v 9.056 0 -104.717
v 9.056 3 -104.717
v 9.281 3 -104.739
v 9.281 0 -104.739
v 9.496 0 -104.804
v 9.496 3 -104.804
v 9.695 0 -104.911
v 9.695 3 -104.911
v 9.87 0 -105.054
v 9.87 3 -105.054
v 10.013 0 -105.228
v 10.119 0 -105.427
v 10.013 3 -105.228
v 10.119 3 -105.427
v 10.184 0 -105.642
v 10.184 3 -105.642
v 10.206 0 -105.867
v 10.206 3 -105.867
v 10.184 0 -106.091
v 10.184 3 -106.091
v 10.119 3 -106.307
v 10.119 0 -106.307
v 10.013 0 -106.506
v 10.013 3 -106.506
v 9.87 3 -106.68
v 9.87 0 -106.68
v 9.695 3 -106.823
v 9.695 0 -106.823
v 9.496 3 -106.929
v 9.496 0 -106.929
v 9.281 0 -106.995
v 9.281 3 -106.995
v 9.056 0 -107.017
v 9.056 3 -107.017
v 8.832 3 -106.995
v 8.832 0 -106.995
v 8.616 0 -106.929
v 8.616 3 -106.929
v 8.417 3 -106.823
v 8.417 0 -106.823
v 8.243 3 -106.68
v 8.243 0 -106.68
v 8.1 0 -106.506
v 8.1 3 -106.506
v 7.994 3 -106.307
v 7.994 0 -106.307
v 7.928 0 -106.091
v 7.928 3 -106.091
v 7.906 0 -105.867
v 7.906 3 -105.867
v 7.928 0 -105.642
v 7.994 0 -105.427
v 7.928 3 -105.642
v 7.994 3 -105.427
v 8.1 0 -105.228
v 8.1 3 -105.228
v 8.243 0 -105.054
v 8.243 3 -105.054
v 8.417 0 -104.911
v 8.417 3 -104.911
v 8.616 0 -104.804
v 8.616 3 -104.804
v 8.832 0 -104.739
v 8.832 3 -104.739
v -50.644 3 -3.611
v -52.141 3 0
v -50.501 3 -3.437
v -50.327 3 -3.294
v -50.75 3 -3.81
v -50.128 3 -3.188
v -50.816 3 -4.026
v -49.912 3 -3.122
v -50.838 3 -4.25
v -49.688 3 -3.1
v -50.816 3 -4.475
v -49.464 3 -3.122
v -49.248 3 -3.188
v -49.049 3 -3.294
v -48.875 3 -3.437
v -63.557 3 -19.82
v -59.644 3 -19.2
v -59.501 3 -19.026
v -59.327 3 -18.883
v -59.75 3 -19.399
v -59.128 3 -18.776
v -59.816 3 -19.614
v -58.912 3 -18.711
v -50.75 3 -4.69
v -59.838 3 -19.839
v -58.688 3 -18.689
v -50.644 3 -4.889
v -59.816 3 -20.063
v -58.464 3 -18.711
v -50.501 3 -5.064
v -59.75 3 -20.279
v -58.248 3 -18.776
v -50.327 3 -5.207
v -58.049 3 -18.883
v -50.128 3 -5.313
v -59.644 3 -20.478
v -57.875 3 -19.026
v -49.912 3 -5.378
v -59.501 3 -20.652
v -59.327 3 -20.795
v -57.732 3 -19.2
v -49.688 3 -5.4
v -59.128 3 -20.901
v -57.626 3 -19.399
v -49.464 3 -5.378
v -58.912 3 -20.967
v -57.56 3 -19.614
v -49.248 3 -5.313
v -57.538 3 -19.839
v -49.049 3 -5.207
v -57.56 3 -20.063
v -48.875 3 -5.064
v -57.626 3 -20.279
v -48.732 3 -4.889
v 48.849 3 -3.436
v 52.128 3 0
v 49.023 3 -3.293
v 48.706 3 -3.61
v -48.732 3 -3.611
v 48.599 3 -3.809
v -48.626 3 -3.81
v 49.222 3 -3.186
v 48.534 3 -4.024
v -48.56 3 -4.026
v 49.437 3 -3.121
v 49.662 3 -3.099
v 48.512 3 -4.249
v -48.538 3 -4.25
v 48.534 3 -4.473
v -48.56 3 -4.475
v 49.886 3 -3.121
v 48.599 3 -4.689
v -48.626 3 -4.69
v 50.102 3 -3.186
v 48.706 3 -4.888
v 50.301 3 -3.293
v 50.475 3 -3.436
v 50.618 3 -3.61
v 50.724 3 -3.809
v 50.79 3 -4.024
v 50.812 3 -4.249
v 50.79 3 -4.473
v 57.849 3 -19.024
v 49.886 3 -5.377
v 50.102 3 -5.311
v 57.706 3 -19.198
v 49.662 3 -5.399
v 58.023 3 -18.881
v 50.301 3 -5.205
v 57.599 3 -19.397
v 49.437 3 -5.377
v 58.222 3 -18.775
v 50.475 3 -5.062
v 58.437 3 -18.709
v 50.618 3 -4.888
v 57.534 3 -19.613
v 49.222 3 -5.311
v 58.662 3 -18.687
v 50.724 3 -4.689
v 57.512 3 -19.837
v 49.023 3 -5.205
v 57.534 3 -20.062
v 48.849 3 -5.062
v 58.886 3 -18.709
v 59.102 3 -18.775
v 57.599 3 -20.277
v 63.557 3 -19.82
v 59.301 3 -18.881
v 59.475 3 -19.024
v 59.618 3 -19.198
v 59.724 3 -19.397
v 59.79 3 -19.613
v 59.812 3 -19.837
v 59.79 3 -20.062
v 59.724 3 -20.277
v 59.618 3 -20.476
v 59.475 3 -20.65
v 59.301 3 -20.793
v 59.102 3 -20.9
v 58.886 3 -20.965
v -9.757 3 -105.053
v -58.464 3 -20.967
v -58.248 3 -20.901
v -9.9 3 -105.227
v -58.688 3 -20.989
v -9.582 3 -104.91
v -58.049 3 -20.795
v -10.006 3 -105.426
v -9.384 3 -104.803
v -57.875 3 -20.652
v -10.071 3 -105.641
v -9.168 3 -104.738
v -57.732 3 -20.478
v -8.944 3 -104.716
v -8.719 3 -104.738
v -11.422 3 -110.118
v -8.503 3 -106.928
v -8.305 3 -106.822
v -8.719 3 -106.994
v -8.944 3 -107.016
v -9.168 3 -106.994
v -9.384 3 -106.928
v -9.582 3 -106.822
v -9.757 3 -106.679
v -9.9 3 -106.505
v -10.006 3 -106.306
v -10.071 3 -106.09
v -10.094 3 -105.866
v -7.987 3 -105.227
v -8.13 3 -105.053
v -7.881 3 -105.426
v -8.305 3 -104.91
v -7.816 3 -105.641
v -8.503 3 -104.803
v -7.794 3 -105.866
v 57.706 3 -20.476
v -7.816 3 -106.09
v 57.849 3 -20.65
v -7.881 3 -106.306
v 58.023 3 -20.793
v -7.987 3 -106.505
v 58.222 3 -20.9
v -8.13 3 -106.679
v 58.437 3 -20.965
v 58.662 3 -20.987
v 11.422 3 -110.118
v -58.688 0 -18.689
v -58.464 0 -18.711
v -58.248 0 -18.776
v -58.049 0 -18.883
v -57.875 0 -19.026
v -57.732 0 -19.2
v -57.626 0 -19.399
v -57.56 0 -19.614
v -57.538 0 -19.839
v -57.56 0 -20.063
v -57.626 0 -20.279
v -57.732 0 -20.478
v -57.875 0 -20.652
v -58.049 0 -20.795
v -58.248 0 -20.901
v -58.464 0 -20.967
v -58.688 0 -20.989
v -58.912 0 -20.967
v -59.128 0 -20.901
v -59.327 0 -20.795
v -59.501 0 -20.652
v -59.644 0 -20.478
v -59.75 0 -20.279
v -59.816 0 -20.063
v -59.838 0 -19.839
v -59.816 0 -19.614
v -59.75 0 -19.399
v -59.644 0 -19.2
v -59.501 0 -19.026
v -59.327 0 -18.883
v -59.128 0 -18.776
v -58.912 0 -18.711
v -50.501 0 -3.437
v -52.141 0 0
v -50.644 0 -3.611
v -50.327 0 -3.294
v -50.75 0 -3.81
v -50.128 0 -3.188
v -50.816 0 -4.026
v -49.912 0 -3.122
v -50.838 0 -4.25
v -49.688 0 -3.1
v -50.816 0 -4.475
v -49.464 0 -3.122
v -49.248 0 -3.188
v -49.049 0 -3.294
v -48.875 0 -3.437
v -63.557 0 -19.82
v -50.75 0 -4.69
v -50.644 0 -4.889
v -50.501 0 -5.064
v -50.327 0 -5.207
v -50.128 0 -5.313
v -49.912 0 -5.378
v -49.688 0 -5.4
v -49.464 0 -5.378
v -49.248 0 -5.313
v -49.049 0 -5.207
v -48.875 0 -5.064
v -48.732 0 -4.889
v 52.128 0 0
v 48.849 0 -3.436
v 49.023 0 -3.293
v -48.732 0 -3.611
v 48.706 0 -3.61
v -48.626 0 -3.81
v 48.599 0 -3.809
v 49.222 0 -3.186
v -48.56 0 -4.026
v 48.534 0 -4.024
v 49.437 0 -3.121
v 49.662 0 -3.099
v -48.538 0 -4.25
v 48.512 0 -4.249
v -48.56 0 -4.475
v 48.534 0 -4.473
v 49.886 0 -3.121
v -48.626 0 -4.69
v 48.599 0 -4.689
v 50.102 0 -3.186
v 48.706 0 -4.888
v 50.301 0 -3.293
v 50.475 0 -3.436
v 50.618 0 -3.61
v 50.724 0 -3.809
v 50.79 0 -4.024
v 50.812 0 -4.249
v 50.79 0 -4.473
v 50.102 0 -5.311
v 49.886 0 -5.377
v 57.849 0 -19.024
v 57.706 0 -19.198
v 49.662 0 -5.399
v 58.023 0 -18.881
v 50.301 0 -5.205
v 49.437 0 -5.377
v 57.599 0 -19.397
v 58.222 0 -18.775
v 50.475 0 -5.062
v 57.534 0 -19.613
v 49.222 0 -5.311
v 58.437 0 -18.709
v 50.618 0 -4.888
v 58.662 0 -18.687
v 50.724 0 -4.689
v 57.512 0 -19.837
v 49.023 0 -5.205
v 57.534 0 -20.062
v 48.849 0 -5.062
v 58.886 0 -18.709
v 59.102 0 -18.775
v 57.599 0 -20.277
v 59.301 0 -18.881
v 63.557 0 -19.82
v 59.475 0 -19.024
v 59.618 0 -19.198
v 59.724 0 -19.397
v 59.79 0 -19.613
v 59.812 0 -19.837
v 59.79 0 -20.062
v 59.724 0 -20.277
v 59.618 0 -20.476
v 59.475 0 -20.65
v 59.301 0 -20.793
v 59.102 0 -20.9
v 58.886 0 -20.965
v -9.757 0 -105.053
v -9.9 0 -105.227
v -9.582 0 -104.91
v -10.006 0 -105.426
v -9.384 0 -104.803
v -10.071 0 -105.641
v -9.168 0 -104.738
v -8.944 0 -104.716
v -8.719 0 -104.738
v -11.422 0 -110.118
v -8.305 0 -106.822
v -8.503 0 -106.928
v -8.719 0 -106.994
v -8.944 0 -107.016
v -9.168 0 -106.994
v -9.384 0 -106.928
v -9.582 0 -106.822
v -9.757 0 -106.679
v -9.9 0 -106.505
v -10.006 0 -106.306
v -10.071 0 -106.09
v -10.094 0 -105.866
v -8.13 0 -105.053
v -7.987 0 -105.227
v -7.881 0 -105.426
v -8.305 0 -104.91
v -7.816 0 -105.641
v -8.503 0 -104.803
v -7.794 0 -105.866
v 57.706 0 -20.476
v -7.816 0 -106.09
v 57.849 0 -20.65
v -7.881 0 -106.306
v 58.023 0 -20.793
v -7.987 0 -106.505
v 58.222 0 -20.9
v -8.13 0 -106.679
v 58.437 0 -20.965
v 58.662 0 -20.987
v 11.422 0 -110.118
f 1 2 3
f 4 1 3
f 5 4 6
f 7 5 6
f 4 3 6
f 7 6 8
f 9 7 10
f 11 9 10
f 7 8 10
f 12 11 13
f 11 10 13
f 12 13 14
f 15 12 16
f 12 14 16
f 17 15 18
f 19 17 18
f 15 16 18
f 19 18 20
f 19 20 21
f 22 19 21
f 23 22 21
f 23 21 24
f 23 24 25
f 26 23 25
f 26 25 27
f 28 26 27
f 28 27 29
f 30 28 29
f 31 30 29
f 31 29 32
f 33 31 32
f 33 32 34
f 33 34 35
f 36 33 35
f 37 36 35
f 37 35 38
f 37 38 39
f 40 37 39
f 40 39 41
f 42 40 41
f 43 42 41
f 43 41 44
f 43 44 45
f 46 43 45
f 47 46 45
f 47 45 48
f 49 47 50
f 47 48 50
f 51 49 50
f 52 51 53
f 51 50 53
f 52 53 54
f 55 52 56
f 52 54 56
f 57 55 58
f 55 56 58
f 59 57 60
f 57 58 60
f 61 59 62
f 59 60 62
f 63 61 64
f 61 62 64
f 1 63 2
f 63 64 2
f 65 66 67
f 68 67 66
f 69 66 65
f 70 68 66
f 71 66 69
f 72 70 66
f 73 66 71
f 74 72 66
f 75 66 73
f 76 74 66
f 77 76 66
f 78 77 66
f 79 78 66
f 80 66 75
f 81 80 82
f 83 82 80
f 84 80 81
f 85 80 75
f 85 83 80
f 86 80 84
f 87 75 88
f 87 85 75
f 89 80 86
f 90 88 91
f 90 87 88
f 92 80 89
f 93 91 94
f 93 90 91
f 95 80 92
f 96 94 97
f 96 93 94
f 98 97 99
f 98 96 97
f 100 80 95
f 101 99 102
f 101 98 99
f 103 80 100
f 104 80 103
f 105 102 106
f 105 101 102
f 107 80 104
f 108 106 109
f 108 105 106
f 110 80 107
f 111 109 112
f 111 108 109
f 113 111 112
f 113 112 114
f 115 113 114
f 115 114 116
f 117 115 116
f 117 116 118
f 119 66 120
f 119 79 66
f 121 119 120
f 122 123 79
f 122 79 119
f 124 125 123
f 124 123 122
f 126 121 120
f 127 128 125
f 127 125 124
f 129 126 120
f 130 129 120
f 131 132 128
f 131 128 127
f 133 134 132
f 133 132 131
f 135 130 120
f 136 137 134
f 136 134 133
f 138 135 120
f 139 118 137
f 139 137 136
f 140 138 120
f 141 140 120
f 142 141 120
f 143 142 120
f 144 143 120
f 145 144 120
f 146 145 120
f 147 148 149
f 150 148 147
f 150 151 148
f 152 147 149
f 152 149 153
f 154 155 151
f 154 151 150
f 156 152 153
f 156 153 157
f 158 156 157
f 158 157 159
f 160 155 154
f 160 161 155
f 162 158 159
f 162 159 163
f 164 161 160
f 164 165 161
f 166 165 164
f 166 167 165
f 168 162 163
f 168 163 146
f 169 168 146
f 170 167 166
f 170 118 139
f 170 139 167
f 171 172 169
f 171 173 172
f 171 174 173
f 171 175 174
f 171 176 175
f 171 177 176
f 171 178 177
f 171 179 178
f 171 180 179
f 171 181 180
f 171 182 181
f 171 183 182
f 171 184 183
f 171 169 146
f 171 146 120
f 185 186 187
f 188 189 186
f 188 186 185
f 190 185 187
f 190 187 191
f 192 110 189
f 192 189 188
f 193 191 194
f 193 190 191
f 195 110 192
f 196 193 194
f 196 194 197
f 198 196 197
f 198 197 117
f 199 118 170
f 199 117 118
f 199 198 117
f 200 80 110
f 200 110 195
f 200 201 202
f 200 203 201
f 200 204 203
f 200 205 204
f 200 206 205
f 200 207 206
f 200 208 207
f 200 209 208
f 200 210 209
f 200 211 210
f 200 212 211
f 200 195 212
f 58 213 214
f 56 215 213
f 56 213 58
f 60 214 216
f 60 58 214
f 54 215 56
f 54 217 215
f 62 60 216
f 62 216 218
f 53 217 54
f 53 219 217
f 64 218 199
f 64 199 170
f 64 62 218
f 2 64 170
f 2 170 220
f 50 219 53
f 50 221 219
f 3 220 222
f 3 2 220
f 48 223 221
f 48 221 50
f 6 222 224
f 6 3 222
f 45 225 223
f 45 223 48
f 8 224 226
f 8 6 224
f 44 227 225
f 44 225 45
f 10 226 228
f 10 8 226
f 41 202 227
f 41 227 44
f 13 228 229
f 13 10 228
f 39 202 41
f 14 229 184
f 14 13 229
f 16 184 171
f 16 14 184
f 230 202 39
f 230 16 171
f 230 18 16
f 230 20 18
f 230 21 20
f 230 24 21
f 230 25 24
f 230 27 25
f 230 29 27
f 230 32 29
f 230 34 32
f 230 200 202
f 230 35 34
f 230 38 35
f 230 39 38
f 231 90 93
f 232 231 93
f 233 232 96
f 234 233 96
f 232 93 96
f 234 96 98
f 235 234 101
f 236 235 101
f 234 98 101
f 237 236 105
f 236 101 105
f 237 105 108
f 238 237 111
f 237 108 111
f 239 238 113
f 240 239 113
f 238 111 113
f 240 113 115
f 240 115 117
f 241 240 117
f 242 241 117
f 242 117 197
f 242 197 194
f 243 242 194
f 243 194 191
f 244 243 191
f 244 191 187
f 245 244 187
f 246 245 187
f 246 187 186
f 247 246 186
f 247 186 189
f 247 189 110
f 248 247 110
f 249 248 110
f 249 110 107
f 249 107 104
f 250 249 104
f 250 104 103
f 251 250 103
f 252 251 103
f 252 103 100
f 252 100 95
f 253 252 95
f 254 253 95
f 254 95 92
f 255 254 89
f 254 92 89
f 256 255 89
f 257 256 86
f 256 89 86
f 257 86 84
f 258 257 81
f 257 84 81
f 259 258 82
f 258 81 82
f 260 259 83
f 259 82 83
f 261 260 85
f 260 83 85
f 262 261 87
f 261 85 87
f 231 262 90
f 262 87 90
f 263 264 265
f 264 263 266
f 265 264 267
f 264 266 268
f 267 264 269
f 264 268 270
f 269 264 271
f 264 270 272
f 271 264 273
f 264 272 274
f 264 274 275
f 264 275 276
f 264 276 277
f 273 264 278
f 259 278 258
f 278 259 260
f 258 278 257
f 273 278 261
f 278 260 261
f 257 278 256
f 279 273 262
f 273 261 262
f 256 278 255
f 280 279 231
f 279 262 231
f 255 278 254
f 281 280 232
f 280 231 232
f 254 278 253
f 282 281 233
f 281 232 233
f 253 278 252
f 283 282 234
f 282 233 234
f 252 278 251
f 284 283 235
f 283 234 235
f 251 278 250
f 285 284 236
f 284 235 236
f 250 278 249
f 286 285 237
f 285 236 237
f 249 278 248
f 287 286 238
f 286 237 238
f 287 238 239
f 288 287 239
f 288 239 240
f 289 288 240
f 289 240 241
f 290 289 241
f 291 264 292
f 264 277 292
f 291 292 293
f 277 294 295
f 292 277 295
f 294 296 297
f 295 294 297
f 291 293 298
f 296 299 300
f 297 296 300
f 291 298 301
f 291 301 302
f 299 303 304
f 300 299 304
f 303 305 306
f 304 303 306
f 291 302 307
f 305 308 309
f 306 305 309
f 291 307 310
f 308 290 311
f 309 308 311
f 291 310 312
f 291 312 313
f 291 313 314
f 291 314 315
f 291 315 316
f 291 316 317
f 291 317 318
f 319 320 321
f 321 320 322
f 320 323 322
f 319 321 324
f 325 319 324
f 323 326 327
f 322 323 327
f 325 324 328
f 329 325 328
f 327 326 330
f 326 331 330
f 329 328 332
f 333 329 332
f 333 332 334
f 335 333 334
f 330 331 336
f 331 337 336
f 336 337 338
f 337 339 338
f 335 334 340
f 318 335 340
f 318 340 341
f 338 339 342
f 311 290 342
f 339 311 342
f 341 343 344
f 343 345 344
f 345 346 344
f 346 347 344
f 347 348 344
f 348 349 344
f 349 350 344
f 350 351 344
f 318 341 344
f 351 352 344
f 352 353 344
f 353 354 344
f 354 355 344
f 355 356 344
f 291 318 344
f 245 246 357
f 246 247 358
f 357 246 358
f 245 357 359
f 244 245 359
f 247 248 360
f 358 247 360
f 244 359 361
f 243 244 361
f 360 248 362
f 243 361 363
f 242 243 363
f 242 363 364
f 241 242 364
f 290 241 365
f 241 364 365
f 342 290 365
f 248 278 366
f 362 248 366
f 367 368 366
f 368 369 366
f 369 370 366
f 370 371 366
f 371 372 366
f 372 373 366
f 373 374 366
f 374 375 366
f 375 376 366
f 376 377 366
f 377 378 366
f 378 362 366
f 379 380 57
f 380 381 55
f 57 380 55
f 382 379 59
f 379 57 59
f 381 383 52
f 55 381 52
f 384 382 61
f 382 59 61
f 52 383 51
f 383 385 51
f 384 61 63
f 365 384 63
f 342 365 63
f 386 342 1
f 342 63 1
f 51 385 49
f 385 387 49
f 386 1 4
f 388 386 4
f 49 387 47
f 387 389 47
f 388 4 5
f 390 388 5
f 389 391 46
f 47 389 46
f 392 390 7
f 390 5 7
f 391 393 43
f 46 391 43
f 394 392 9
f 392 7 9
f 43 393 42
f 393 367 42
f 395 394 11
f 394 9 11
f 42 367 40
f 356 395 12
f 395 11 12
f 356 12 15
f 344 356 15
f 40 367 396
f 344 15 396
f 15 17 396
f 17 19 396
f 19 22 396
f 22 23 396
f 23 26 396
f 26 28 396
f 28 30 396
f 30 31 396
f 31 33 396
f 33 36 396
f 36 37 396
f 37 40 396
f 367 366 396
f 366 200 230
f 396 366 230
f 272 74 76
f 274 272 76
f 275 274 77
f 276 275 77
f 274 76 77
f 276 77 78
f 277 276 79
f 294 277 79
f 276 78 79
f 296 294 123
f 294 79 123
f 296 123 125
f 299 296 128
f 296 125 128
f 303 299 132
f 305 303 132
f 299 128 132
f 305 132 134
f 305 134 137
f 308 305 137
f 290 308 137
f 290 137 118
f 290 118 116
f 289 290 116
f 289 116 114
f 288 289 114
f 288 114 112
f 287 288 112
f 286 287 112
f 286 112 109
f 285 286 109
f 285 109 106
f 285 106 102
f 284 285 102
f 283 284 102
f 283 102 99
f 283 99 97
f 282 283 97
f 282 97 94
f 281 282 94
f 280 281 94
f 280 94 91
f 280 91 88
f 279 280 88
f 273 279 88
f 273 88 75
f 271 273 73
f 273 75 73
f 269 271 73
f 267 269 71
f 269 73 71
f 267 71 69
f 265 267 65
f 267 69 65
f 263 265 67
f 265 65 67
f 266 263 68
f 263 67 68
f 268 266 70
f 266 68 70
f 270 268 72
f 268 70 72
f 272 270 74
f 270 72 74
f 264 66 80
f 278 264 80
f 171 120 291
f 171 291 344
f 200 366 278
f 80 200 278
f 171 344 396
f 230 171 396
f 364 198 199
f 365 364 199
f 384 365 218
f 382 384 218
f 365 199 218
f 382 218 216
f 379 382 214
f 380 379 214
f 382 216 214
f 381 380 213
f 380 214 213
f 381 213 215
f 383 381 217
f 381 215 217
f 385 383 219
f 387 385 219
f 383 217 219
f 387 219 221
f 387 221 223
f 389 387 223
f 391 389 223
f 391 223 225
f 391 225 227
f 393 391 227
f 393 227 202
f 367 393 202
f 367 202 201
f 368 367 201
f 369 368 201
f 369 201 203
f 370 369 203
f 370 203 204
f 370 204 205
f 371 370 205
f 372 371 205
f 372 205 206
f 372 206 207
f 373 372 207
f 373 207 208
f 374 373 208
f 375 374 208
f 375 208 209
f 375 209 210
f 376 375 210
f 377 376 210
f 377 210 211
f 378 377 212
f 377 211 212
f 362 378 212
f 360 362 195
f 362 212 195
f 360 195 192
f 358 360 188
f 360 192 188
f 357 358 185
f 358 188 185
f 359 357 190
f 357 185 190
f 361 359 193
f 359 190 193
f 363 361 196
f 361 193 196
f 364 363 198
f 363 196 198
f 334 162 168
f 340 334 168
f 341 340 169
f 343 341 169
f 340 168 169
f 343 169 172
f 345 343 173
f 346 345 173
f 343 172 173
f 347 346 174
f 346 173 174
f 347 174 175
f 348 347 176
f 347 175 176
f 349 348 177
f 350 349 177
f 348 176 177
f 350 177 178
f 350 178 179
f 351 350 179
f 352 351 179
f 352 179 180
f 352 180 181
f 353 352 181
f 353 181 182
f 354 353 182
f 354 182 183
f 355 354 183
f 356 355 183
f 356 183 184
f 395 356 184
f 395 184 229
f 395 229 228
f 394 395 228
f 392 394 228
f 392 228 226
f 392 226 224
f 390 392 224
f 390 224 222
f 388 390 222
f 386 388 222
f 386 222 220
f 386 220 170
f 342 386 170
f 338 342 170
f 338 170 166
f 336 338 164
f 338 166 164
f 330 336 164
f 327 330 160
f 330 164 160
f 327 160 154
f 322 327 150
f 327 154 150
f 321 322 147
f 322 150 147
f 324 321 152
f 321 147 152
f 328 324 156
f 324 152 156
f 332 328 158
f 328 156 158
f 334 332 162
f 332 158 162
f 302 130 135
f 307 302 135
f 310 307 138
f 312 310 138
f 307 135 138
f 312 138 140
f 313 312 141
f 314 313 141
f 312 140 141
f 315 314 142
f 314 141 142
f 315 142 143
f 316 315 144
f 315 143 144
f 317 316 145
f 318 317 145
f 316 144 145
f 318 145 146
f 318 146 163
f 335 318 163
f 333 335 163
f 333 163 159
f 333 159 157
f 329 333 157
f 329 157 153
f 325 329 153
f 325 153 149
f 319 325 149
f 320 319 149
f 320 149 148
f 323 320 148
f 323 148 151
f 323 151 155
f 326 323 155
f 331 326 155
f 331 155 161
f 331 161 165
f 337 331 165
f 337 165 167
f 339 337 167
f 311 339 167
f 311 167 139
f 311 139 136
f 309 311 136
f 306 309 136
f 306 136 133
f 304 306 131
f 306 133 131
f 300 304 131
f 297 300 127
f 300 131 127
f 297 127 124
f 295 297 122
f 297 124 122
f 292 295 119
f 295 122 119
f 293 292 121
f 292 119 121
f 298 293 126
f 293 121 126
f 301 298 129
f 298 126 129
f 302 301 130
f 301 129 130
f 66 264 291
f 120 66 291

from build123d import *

# Parameters (mm, degrees)
RESSALTO_EXTRUS_O1_DEPTH = 3
CORTE_EXTRUS_O1_DEPTH    = 151.026697624
ESBO_O5_R                = 1.15
ESBO_O5_R_2              = 1.149998009
ESBO_O5_R_3              = 1.149993787
CORTE_EXTRUS_O3_DEPTH    = 128.178545465


with BuildPart() as part:
    # Esboço1 → Ressalto-extrusão1 (new body)
    with BuildSketch(Plane(origin=(0, 0, 0), x_dir=(1, 0, 0), z_dir=(0, 1, 0))):
        Polygon((-75, 0), (75, 0), (0, 129.9), align=None)
    extrude(amount=RESSALTO_EXTRUS_O1_DEPTH)

    # Esboço3 → Corte-extrusão1 (cut, through all)
    with BuildSketch(Plane(origin=(0, 3, 0), x_dir=(1, 0, 0), z_dir=(0, 1, 0))):
        Polygon((52.12820532, 0), (63.556663987, 19.819857975), (75, 0), align=None)
        Polygon((-52.141215794, 0), (-63.556663987, 19.819857975), (-75, 0), align=None)
        Polygon((-11.421585635, 110.117813679), (11.421585635, 110.117813679), (0, 129.9), align=None)
    extrude(amount=-CORTE_EXTRUS_O1_DEPTH, mode=Mode.SUBTRACT)

    # Esboço5 → Corte-extrusão3 (cut, through all)
    with BuildSketch(Plane(origin=(0, 3, 0), x_dir=(1, 0, 0), z_dir=(0, 1, 0))):
        with Locations(Location((-49.687989721, 4.250373636, 0), (0, 0, 270))):
            Circle(ESBO_O5_R)
        with Locations(Location((-58.687989721, 19.838830904, 0), (0, 0, 270))):
            Circle(ESBO_O5_R)
        with Locations(Location((58.661761519, 19.83730914, 0), (0, 0, 270))):
            Circle(ESBO_O5_R)
        with Locations(Location((49.661761519, 4.248851872, 0), (0, 0, 270))):
            Circle(ESBO_O5_R)
        with Locations(Location((-8.943534892, 105.865797451, 0), (0, 0, 270))):
            Circle(ESBO_O5_R_2)
        with Locations(Location((9.05637457, 105.866807251, 0), (0, 0, 270))):
            Circle(ESBO_O5_R_3)
    extrude(amount=-CORTE_EXTRUS_O3_DEPTH, mode=Mode.SUBTRACT)


solid = part.part
